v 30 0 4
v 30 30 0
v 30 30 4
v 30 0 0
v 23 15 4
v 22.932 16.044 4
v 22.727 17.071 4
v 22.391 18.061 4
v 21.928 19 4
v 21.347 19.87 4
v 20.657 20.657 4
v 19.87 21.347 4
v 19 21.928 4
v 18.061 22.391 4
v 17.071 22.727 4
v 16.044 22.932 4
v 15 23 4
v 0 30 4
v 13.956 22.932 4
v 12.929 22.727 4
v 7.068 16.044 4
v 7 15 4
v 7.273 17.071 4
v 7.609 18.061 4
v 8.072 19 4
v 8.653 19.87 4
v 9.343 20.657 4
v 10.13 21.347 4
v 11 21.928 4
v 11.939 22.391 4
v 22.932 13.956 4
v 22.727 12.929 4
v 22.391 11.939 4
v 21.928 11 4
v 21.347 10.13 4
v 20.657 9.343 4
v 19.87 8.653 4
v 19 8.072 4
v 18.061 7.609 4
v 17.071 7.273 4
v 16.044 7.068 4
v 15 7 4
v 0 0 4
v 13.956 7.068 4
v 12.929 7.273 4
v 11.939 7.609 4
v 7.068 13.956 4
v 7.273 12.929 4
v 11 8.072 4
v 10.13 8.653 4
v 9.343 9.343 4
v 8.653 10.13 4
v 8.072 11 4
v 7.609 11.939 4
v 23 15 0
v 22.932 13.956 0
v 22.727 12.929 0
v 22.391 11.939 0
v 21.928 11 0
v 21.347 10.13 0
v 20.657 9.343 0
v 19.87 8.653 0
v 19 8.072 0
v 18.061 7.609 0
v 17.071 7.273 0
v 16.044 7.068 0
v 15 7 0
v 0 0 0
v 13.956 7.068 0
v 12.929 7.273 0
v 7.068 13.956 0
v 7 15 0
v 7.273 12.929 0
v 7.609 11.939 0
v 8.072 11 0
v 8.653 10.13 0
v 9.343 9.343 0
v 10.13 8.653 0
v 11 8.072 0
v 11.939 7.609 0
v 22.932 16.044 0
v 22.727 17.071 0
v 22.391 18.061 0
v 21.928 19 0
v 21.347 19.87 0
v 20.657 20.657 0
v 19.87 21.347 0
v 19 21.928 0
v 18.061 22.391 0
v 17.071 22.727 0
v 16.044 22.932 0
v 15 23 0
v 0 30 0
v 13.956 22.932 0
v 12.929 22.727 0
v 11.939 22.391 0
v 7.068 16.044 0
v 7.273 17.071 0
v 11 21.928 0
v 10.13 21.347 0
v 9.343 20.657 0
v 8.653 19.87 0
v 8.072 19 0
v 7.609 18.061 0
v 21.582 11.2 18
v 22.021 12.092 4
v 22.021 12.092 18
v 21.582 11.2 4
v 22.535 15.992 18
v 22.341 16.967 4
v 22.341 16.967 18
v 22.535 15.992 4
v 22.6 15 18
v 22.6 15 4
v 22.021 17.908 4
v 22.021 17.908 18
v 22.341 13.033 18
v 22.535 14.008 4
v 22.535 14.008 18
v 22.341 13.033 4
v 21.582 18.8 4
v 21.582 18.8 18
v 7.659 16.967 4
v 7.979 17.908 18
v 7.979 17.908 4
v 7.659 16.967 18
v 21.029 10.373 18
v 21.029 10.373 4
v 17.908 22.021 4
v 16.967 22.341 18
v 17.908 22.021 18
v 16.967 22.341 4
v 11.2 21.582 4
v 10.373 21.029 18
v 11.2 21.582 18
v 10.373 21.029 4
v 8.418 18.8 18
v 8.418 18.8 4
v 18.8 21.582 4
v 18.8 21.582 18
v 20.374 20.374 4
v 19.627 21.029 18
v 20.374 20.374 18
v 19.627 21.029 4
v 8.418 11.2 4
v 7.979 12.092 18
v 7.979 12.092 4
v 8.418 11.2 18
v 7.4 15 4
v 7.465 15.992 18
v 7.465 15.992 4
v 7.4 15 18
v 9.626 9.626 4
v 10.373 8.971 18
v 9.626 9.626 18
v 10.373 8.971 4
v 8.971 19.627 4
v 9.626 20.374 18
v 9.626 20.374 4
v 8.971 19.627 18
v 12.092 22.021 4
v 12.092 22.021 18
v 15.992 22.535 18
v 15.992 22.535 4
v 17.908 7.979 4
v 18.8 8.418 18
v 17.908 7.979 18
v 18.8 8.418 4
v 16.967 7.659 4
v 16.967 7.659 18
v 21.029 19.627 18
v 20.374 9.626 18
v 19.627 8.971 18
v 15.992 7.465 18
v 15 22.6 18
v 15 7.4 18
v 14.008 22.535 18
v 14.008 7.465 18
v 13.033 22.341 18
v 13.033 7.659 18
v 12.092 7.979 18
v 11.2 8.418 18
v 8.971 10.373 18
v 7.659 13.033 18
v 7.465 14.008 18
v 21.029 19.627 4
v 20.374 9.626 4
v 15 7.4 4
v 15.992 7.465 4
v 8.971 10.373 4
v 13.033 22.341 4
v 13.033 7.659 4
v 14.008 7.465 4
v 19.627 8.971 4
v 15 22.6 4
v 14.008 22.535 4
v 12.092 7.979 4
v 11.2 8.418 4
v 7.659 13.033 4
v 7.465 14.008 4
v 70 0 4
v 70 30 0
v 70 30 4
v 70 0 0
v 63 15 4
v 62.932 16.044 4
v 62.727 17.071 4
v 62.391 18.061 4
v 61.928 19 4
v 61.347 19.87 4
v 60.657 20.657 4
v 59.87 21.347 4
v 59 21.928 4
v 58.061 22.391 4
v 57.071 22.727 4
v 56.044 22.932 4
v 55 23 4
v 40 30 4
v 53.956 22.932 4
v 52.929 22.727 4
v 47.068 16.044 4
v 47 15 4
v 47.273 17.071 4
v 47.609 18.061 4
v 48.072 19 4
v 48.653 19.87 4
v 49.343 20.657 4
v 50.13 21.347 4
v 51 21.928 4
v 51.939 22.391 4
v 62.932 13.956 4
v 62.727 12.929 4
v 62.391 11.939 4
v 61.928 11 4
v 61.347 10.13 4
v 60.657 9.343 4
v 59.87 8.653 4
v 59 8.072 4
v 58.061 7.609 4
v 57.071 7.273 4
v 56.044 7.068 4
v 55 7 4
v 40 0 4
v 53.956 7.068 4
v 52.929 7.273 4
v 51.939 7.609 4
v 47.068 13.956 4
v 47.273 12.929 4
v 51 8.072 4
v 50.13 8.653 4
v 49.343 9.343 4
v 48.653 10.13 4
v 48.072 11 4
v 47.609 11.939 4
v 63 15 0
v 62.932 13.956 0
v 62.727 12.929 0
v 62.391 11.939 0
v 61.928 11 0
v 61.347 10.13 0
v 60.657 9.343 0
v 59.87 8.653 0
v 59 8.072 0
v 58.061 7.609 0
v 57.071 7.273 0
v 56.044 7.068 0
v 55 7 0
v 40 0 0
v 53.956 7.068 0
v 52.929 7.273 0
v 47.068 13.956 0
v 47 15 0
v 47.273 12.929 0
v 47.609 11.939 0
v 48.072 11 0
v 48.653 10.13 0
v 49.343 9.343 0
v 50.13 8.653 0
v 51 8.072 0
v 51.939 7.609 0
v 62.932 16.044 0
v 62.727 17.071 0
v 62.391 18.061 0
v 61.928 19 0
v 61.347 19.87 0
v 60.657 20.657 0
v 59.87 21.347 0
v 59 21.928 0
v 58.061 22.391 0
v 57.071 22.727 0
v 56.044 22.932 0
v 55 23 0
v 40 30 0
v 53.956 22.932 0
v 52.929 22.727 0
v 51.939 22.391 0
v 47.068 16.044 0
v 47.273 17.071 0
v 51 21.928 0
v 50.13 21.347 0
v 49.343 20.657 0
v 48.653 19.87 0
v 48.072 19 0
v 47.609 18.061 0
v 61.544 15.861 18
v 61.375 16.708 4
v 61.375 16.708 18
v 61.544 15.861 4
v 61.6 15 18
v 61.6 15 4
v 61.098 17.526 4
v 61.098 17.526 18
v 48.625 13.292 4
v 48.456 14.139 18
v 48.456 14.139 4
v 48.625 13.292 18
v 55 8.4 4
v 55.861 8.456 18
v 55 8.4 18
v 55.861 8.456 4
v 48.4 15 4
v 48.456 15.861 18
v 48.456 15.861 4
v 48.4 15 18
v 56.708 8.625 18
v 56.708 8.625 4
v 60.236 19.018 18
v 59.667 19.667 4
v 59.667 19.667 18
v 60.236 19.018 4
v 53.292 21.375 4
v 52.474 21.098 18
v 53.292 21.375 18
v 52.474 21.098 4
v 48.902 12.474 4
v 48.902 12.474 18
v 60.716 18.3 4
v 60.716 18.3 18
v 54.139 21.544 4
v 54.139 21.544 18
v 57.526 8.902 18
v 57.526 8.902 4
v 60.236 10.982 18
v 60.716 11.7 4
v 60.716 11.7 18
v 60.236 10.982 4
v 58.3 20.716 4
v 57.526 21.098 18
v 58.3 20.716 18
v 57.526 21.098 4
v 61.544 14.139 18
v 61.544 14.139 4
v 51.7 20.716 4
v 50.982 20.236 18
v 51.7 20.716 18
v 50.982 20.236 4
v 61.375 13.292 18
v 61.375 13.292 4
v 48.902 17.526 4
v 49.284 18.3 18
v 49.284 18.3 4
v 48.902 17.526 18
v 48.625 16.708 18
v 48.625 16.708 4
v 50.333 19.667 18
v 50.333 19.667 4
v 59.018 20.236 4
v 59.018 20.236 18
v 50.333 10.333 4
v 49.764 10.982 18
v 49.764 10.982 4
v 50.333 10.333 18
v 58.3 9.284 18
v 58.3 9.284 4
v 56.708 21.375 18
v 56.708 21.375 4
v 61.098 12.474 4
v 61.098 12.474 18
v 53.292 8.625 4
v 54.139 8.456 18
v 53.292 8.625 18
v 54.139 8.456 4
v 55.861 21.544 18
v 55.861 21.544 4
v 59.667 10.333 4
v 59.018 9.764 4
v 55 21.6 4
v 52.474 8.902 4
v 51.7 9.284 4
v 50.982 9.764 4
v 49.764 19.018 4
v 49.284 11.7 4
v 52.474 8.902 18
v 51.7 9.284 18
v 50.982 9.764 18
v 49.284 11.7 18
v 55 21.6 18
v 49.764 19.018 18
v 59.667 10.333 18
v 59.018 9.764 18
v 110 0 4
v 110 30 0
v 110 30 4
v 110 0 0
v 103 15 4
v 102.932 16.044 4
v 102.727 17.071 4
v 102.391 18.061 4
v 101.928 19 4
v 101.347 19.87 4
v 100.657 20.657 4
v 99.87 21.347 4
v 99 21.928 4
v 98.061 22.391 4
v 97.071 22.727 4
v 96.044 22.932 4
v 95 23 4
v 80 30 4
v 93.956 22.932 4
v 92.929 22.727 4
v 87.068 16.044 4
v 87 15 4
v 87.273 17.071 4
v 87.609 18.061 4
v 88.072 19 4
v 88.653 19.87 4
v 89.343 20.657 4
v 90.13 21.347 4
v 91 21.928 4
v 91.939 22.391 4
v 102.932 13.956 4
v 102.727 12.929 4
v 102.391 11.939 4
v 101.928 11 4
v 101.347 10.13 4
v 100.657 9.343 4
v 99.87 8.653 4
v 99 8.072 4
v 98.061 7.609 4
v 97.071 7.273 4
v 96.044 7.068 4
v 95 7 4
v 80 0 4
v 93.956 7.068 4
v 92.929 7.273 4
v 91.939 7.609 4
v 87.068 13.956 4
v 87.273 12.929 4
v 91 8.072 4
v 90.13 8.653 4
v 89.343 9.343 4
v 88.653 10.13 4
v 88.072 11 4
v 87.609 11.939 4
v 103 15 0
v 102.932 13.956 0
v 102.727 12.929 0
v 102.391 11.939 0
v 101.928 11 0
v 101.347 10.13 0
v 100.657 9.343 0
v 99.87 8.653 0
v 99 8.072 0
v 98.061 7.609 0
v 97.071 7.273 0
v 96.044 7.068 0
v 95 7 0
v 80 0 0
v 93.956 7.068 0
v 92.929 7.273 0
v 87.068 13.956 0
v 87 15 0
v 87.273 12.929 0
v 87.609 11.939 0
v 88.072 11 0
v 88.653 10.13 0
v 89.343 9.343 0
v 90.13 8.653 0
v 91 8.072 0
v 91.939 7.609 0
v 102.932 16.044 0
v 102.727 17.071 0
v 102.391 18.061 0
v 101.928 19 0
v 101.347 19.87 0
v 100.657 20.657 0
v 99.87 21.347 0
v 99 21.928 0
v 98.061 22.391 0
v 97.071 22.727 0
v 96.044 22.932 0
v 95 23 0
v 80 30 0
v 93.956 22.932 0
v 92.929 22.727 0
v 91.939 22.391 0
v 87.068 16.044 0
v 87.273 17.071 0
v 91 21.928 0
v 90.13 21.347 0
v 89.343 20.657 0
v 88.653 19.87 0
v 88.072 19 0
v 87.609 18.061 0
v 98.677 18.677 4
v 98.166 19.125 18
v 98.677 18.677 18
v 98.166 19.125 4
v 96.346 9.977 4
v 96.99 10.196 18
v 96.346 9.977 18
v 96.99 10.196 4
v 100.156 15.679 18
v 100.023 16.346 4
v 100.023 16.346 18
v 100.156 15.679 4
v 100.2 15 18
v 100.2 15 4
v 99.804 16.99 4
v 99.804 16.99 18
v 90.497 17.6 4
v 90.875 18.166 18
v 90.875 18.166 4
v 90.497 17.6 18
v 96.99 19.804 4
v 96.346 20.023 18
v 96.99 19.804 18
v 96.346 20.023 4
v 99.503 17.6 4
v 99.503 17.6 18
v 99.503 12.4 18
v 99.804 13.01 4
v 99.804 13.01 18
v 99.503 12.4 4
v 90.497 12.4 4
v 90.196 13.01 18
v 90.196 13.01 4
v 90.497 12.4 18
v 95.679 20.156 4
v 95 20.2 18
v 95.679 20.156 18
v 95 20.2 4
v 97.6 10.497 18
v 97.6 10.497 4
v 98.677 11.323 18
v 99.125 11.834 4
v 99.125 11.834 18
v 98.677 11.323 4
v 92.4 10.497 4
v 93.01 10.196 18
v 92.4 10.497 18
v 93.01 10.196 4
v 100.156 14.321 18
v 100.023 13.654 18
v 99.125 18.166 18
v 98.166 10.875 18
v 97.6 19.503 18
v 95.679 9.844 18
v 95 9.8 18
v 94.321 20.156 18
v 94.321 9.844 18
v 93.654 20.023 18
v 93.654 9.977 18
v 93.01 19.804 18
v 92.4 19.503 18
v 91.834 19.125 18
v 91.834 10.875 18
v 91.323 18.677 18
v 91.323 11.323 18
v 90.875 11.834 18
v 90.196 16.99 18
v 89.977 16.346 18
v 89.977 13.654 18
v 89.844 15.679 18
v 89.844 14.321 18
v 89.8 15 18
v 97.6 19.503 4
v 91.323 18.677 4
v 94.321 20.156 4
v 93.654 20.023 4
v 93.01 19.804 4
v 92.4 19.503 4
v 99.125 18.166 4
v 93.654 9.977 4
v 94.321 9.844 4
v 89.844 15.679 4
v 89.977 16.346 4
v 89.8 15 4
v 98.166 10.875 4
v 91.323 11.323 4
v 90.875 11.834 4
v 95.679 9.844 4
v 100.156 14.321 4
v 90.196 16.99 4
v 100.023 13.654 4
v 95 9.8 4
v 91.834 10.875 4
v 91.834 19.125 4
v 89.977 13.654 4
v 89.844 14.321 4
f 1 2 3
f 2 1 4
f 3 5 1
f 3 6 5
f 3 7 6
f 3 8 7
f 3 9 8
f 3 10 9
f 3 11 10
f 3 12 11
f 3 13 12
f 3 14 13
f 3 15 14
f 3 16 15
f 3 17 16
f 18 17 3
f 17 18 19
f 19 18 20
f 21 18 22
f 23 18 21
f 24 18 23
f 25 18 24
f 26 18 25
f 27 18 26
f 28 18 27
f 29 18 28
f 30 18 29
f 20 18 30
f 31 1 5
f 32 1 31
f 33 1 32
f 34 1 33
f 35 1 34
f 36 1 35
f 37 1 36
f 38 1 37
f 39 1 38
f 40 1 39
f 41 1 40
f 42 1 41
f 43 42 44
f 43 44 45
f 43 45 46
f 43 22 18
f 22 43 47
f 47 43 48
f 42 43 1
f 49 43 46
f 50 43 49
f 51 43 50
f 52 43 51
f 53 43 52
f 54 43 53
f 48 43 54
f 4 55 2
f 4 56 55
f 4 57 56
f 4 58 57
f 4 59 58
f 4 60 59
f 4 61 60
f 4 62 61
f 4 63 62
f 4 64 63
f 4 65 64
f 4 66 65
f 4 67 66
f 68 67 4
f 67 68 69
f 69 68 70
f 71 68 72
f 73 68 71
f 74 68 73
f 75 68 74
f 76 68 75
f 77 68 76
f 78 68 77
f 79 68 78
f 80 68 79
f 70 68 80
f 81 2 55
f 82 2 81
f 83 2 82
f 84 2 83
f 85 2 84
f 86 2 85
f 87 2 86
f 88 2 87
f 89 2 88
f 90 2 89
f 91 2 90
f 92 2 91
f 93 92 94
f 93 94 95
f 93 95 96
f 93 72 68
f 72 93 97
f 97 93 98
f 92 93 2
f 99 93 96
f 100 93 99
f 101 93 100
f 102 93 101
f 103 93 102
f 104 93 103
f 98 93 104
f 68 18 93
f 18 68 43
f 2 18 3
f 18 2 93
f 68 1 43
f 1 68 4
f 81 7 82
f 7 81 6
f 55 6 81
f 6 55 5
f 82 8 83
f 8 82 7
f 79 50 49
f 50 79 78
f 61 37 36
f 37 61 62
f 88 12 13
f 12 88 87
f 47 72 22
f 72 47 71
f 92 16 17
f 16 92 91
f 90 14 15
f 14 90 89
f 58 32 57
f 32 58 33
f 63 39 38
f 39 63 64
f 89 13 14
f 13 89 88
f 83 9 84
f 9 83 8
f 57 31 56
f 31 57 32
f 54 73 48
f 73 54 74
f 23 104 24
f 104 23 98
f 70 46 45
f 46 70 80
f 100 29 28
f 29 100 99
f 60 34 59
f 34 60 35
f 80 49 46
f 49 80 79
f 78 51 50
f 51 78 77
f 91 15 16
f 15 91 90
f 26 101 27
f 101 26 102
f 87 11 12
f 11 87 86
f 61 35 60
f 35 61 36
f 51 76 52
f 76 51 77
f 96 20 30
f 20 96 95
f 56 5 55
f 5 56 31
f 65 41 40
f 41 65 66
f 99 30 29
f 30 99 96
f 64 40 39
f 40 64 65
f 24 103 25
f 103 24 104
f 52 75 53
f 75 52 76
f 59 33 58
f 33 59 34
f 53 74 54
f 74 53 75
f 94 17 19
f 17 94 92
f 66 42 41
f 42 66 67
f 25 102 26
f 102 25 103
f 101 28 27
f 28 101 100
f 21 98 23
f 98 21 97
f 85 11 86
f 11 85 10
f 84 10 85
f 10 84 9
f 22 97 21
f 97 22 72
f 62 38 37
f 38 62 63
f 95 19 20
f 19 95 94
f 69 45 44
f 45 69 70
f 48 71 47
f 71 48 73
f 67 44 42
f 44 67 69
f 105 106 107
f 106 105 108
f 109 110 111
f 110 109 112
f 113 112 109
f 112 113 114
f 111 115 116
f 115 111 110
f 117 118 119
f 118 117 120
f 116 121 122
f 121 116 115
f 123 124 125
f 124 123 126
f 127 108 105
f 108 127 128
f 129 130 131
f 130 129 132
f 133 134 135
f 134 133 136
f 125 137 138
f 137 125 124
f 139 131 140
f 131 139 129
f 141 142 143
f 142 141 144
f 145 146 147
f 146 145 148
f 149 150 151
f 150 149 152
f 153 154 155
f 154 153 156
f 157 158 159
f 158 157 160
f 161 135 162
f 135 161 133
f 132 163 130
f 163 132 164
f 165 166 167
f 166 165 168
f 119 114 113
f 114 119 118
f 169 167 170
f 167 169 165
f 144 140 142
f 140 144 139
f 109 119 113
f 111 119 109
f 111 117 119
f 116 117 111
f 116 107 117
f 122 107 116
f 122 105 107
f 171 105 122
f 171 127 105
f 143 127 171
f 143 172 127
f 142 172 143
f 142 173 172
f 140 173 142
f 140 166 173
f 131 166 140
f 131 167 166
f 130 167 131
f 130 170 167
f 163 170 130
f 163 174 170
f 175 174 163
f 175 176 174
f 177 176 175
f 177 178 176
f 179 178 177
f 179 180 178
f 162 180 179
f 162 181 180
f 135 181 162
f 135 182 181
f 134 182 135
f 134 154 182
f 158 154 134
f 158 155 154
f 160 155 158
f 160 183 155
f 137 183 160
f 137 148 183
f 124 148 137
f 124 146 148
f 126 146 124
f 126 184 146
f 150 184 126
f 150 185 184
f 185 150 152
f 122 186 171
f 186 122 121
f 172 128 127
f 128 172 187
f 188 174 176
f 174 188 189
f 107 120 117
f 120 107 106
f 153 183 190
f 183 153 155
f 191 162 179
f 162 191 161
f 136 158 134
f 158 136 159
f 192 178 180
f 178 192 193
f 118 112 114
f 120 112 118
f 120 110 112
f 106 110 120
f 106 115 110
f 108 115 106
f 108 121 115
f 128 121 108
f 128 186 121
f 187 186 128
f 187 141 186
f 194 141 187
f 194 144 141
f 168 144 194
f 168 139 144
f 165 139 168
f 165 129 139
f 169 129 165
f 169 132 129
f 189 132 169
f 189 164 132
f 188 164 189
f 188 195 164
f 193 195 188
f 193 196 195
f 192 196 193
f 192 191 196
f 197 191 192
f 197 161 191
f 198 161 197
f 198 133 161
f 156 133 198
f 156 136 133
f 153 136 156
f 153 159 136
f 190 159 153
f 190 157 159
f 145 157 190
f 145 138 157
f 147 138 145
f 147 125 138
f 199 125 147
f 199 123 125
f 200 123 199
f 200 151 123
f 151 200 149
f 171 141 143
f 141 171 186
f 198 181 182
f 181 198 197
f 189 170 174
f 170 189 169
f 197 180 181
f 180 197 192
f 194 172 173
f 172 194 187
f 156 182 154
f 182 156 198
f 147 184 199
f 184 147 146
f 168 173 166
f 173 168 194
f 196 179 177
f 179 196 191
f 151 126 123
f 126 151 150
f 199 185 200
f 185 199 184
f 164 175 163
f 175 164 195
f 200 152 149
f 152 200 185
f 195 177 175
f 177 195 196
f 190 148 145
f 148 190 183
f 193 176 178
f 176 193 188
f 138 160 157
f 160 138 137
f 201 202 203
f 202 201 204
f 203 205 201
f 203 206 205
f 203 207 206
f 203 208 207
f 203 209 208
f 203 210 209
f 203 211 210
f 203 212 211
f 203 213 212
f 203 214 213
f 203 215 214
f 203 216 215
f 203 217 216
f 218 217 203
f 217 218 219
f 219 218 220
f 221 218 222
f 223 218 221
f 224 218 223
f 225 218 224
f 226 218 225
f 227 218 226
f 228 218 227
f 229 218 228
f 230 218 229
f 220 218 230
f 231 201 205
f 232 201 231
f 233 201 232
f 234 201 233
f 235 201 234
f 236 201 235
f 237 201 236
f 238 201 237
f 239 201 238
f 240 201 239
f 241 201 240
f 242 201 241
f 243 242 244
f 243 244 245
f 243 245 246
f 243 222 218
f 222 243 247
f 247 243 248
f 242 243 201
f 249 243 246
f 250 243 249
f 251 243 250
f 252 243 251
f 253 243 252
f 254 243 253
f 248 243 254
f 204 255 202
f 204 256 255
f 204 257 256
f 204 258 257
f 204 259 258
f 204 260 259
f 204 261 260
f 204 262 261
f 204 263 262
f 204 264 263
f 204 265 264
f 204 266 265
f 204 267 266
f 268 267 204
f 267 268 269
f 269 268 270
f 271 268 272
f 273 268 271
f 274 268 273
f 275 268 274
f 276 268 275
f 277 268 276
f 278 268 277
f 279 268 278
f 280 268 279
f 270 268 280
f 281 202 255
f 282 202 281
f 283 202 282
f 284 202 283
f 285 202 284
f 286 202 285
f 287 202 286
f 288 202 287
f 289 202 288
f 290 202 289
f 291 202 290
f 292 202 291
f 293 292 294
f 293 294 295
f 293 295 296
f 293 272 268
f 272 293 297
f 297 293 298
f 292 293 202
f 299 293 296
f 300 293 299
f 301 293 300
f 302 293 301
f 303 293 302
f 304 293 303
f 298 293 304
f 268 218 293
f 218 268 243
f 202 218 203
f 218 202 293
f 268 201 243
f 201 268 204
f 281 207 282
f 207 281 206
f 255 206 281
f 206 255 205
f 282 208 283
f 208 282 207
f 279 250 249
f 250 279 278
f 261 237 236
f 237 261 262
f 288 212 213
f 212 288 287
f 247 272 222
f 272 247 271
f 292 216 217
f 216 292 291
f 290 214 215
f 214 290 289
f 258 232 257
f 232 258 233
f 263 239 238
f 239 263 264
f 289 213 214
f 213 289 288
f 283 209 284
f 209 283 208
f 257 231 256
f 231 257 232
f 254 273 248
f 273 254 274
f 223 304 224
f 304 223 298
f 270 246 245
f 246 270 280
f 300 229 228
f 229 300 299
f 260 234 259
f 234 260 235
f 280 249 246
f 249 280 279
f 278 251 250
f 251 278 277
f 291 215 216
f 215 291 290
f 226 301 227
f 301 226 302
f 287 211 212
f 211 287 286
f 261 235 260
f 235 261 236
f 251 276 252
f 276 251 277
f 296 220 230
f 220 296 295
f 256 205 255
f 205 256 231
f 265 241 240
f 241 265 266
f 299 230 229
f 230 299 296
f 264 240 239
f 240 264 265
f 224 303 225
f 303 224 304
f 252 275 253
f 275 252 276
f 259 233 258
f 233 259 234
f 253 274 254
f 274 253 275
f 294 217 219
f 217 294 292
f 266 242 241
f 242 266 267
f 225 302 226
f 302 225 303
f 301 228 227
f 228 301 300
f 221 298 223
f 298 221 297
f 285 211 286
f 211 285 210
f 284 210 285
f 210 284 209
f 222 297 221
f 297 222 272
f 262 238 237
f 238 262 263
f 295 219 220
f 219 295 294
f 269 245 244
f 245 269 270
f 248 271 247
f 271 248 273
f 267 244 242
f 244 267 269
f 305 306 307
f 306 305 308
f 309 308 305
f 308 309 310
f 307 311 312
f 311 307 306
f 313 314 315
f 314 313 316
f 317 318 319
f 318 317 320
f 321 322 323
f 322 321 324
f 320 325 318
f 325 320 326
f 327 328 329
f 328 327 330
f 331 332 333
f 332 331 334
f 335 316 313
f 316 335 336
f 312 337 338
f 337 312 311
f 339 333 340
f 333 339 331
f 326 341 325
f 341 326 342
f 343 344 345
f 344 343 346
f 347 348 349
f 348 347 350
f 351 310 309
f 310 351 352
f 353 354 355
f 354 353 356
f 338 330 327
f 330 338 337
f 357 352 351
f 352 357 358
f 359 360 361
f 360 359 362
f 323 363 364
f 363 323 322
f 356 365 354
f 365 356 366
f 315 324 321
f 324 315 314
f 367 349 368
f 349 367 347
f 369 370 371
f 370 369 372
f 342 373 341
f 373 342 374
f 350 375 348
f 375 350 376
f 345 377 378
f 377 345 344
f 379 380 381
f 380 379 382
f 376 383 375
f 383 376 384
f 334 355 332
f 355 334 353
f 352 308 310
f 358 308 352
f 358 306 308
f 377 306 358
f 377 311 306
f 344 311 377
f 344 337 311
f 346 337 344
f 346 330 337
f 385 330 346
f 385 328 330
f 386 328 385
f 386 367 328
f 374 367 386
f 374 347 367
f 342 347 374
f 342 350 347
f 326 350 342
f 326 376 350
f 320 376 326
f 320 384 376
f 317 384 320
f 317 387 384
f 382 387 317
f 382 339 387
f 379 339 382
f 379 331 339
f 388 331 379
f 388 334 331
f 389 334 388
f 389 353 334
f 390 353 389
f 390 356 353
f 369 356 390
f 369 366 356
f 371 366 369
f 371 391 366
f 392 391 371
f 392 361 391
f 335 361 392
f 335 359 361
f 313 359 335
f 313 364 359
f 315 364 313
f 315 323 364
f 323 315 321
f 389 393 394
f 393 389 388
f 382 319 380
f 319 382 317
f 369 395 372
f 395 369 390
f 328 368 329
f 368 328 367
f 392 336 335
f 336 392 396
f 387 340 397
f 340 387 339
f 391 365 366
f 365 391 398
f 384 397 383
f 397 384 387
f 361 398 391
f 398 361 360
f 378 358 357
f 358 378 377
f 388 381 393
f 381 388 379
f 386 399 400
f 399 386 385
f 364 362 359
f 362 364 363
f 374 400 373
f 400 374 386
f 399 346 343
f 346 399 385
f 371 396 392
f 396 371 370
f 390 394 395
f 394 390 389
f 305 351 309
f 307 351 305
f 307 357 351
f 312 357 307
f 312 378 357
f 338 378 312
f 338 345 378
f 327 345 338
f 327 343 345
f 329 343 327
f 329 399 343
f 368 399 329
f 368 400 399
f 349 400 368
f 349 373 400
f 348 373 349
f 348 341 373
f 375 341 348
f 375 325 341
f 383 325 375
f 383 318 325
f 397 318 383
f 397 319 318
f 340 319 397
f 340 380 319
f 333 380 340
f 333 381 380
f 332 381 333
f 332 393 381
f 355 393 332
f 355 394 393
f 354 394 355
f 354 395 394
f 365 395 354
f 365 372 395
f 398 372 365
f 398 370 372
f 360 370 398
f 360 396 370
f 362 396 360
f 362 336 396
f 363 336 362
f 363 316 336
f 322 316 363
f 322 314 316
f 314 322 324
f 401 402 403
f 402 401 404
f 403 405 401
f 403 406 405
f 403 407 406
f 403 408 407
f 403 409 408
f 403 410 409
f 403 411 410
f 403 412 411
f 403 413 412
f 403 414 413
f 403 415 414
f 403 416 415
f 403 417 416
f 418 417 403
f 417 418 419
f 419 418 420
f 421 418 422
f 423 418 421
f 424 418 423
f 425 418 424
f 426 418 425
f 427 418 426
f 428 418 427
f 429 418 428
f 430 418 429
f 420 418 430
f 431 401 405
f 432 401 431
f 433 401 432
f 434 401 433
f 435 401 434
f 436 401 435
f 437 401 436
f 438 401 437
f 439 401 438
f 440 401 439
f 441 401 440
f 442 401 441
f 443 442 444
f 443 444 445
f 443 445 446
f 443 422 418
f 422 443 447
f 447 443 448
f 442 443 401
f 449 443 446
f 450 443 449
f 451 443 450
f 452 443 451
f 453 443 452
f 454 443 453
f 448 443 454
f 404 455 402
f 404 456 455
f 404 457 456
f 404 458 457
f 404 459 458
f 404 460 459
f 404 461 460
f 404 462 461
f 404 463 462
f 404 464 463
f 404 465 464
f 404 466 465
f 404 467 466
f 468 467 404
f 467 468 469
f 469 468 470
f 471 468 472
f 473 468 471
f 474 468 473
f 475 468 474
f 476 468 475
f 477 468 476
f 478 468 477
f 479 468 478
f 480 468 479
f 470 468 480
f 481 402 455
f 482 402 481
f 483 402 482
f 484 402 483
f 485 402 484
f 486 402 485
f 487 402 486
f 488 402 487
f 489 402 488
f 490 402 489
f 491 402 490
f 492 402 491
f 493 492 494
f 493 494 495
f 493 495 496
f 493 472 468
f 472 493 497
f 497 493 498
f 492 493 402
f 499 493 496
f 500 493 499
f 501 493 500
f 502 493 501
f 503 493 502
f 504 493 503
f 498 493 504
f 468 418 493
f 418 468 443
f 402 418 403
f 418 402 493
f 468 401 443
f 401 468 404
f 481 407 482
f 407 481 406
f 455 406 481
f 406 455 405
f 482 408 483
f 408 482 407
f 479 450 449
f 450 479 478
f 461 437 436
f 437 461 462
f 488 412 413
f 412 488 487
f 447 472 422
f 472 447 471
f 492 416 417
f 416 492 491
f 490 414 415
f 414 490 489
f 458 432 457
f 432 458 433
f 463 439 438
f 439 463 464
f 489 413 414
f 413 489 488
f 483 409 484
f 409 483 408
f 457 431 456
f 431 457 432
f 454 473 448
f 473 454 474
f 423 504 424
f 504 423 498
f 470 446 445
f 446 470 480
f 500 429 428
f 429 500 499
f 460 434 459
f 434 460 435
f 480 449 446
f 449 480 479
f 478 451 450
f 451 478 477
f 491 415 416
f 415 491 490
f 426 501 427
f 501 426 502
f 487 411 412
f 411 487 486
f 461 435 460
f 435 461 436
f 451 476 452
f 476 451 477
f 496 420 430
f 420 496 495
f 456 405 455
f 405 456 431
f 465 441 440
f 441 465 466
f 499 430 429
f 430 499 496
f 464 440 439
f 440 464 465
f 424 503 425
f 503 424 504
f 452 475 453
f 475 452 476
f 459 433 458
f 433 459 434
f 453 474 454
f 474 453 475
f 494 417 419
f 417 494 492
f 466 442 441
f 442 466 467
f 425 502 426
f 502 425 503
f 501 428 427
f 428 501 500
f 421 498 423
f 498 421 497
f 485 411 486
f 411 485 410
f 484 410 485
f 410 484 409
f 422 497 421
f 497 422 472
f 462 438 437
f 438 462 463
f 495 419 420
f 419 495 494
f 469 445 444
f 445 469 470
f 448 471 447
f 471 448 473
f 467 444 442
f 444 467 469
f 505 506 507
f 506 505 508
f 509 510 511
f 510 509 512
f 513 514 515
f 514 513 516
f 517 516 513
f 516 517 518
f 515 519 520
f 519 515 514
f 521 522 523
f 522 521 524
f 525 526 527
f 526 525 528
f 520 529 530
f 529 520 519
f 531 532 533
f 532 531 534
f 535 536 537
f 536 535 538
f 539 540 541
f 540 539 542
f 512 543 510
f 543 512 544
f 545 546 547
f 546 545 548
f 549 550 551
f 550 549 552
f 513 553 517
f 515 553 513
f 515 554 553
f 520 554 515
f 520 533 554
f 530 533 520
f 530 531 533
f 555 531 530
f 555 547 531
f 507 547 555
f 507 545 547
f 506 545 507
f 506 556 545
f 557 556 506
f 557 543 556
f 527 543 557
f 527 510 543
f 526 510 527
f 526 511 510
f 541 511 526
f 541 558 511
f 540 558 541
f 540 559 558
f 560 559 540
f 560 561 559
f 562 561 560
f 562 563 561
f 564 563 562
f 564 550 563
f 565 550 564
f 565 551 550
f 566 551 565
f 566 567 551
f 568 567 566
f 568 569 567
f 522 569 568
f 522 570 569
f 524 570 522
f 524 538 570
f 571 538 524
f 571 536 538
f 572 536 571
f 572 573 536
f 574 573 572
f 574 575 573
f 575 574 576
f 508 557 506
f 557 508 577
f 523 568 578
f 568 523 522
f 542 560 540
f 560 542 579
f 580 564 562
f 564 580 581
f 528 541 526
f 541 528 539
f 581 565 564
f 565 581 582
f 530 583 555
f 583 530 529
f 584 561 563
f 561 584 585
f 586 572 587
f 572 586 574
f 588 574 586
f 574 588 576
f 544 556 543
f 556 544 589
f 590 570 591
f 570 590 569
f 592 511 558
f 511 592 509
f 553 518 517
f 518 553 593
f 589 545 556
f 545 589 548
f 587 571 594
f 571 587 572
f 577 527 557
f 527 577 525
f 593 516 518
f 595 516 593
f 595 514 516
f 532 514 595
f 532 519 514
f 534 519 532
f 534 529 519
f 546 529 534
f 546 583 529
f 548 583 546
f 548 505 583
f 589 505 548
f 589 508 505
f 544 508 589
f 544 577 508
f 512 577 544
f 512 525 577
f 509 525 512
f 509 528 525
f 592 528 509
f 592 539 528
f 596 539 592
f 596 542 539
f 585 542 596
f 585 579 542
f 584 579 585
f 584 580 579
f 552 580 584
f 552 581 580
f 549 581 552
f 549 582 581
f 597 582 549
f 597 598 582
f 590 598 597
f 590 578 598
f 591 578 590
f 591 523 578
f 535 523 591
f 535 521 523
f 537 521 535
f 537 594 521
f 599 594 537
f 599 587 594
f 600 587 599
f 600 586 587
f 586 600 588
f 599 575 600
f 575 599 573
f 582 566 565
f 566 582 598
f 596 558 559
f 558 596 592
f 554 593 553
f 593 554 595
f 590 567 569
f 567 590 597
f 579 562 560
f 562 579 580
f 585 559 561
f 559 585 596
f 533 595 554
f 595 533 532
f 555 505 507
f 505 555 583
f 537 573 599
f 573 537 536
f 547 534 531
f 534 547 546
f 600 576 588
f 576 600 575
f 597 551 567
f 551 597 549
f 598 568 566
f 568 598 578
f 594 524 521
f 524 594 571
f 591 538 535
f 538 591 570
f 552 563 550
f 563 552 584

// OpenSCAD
// Fit types: three peg-in-hole pairs (press / slip / free) at
// progressively larger per-side clearance -- concentric circles, viewed
// from top, with a visibly different annular gap per pair.
$fn = 48;
plate = 30; plate_h = 4; hole_r = 8; peg_h = 14;

module pegpair(x0, peg_r) {
    translate([x0, 0, 0]) {
        difference() {
            cube([plate, plate, plate_h]);
            translate([plate / 2, plate / 2, -1]) cylinder(h = plate_h + 2, r = hole_r);
        }
        translate([plate / 2, plate / 2, plate_h]) cylinder(h = peg_h, r = peg_r);
    }
}

pegpair(0,  7.6);  // press / interference: small gap, exaggerated for visibility
pegpair(40, 6.6);  // slip / close: medium gap
pegpair(80, 5.2);  // free / running: large, clearly-visible gap
